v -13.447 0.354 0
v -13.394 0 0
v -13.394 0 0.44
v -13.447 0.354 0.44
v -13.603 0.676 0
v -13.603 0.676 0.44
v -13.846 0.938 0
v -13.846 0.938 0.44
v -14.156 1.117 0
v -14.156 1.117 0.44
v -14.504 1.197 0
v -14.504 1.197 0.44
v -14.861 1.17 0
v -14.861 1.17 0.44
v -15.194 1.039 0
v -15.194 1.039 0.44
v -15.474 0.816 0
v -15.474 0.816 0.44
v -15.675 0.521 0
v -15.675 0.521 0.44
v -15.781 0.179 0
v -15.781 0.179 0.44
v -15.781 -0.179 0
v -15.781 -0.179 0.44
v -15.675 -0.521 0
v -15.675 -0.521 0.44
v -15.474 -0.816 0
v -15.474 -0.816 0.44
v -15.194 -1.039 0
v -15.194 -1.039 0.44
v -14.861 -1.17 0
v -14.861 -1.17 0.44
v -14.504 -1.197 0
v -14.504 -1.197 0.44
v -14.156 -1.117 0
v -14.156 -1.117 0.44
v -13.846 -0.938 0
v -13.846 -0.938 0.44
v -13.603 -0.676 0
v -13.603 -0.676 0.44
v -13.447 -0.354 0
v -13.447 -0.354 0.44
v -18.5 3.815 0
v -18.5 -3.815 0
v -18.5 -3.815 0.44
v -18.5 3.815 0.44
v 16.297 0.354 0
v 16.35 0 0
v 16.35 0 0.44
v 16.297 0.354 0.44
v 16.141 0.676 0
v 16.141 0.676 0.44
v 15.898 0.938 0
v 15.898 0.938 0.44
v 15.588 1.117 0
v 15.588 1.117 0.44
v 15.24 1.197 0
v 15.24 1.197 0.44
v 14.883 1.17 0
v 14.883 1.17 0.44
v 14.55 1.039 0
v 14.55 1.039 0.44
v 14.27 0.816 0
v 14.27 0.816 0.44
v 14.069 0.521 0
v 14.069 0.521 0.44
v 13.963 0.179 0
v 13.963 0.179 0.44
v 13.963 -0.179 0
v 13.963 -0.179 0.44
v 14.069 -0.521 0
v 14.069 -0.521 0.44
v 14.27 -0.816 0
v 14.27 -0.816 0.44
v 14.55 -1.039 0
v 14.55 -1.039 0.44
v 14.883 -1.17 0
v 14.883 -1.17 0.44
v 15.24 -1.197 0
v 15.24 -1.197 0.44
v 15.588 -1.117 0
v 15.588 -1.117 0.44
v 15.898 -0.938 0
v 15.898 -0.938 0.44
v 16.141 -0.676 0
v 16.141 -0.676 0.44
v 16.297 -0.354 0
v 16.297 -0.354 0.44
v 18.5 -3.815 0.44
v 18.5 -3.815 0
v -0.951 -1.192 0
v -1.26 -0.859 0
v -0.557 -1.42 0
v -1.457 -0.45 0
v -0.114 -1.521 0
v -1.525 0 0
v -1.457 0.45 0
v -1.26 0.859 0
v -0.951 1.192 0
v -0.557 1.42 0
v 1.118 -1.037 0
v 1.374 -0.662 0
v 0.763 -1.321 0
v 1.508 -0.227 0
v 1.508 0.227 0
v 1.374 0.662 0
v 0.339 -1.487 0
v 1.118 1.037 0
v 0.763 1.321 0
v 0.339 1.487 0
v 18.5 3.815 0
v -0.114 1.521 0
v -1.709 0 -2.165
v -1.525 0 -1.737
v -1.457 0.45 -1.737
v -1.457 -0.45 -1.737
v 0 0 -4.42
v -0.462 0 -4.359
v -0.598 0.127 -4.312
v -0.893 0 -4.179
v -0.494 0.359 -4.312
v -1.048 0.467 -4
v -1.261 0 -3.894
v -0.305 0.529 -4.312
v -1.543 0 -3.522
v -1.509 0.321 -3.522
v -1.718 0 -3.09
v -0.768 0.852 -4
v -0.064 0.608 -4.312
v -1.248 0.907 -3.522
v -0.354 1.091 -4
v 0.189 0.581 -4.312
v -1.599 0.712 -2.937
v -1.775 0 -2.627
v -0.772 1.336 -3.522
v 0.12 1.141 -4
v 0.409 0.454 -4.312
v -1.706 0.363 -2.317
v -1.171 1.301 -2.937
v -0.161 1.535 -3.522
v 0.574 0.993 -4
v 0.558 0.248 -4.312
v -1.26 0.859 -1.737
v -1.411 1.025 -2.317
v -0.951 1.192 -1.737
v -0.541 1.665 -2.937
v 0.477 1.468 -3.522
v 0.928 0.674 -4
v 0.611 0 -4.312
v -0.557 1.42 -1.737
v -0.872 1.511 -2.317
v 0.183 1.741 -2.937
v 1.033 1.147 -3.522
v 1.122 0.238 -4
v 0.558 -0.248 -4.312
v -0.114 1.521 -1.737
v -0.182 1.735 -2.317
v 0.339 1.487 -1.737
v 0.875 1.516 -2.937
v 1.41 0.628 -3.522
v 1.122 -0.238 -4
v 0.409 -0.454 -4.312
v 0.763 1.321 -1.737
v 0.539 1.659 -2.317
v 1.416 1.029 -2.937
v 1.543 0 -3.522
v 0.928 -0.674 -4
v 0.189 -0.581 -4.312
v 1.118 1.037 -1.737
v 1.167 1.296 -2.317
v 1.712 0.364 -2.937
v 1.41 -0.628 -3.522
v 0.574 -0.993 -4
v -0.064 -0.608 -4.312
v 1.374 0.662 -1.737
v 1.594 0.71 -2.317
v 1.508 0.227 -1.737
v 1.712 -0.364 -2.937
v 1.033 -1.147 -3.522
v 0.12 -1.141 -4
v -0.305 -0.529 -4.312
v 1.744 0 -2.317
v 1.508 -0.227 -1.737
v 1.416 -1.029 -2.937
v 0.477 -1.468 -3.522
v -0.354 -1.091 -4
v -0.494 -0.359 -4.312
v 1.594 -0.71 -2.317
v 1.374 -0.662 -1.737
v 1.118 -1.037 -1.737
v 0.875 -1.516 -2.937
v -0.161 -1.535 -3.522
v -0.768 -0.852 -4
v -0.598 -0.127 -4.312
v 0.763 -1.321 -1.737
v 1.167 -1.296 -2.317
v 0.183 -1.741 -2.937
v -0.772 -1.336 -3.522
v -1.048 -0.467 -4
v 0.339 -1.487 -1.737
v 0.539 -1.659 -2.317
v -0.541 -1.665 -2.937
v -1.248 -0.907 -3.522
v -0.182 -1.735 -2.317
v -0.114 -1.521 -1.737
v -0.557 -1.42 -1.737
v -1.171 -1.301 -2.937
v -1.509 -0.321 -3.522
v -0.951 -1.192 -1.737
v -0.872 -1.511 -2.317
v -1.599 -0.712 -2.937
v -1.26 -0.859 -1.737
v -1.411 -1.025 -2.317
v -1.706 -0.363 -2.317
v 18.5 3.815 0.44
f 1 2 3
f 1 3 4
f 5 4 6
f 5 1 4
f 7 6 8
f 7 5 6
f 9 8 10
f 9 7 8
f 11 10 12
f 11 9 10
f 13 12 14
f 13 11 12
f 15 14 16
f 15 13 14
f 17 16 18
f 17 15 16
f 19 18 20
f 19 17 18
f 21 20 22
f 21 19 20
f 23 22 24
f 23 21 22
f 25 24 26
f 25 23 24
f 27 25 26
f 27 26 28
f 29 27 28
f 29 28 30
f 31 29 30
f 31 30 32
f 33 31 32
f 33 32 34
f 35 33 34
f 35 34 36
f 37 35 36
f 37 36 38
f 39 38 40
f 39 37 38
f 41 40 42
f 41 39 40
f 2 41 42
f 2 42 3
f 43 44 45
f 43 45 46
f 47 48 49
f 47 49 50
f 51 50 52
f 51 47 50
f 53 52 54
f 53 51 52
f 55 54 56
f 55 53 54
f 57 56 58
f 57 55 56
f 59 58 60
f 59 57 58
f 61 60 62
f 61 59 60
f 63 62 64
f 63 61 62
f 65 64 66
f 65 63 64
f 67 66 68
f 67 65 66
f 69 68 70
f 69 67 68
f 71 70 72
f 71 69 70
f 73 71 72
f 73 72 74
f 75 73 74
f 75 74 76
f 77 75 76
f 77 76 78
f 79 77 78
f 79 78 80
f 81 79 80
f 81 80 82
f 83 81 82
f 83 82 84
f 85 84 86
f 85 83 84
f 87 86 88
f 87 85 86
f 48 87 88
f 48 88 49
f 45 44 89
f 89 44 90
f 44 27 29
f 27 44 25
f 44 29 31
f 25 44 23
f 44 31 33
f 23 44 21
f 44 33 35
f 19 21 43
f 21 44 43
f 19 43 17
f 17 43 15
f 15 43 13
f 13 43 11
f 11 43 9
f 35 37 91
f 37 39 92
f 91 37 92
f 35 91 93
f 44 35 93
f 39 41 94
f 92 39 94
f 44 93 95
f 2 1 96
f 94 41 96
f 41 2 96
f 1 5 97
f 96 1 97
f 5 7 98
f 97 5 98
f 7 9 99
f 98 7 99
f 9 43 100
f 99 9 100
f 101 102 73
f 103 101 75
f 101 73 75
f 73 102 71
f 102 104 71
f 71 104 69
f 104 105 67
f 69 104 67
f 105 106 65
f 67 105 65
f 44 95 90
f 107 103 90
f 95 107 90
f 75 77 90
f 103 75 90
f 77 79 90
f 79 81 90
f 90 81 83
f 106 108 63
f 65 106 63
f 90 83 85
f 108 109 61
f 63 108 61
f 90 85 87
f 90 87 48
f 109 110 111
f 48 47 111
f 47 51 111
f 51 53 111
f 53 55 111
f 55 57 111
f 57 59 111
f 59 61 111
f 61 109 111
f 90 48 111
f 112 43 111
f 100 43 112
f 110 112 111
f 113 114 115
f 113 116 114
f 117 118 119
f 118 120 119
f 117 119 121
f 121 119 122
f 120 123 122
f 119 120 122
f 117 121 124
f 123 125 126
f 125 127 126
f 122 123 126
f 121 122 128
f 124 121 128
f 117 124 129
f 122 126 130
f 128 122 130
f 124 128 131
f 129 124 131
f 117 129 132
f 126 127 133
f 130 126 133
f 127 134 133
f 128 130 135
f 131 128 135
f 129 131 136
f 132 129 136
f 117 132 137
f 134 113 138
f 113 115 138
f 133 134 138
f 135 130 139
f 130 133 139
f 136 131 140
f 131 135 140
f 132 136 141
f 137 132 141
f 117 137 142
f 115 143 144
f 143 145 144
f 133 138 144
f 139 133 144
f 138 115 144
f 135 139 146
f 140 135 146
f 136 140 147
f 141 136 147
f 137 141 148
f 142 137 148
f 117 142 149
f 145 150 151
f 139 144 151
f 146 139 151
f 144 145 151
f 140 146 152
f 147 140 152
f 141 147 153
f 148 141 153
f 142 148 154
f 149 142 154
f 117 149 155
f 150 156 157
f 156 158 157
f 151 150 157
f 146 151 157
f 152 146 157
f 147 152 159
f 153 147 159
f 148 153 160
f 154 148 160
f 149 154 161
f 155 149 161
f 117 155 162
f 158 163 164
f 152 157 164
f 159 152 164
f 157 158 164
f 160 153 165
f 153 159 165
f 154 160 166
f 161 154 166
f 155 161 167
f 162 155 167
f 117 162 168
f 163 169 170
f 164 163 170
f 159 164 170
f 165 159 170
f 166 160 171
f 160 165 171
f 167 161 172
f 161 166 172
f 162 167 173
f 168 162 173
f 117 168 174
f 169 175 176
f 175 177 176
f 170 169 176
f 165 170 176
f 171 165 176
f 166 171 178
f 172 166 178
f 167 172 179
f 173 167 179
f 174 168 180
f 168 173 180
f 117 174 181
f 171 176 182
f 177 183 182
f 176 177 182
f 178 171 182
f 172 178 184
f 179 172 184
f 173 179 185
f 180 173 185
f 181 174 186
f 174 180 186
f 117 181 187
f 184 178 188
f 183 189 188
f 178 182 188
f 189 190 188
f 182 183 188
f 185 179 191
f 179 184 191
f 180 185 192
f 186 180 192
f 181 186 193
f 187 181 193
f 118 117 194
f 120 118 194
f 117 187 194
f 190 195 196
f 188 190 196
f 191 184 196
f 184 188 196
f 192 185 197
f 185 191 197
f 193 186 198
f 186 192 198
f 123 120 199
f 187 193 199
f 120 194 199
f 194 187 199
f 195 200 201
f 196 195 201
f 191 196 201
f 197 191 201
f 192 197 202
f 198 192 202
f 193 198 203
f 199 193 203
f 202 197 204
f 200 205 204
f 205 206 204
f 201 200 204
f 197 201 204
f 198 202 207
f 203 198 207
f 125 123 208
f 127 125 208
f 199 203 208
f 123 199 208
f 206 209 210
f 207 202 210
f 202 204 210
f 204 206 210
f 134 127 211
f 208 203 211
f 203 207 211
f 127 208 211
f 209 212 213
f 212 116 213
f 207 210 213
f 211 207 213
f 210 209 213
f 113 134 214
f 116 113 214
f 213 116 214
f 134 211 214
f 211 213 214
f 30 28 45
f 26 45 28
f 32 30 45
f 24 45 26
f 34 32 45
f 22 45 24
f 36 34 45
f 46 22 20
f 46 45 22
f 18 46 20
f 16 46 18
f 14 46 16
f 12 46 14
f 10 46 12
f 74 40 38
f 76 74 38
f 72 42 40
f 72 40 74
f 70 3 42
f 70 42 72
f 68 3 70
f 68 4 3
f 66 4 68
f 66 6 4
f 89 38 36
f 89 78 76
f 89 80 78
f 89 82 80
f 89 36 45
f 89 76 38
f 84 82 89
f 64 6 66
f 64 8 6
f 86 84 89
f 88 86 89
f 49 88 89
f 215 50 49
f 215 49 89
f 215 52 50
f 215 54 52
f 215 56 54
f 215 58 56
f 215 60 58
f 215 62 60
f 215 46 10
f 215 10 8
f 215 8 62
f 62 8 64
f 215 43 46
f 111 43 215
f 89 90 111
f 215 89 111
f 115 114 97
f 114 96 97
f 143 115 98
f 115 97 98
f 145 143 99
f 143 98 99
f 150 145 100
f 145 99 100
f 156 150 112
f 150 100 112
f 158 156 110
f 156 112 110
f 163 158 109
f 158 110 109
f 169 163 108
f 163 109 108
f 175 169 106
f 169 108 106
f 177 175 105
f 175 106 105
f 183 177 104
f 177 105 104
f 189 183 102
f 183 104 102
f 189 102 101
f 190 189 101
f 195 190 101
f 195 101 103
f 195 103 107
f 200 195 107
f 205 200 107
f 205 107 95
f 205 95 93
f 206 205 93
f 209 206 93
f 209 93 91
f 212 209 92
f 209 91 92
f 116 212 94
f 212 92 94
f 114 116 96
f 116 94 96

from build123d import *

# Parameters (mm, degrees)
SKETCH1_W           = 37
SKETCH1_H           = 7.63
SKETCH1_R           = 1.2
BOSS_EXTRUDE1_DEPTH = 0.44


with BuildPart() as part:
    # Sketch1 → Boss-Extrude1 (new body)
    with BuildSketch(Plane.XY):
        Rectangle(SKETCH1_W, SKETCH1_H)
        with Locations((-14.59410802, 0)):
            Circle(SKETCH1_R, mode=Mode.SUBTRACT)
        with Locations((15.15, 0)):
            Circle(SKETCH1_R, mode=Mode.SUBTRACT)
    extrude(amount=BOSS_EXTRUDE1_DEPTH)

    # Sketch2 → Revolve2 (revolve)
    with BuildSketch(Plane(origin=(0, 0, 0), x_dir=(1, 0, 0), z_dir=(0, 1, 0))):
        with BuildLine():
            Line((0, 0), (0, 4.42))
            ThreePointArc((0, 4.42), (-1.543186446, 3.522040816), (-1.525, 1.736704894))
            Line((-1.525, 1.736704894), (-1.525, 0))
            Line((-1.525, 0), (0, 0))
        make_face()
    revolve(axis=Axis((0, 0, 0), (0, 0, -1)))


solid = part.part
